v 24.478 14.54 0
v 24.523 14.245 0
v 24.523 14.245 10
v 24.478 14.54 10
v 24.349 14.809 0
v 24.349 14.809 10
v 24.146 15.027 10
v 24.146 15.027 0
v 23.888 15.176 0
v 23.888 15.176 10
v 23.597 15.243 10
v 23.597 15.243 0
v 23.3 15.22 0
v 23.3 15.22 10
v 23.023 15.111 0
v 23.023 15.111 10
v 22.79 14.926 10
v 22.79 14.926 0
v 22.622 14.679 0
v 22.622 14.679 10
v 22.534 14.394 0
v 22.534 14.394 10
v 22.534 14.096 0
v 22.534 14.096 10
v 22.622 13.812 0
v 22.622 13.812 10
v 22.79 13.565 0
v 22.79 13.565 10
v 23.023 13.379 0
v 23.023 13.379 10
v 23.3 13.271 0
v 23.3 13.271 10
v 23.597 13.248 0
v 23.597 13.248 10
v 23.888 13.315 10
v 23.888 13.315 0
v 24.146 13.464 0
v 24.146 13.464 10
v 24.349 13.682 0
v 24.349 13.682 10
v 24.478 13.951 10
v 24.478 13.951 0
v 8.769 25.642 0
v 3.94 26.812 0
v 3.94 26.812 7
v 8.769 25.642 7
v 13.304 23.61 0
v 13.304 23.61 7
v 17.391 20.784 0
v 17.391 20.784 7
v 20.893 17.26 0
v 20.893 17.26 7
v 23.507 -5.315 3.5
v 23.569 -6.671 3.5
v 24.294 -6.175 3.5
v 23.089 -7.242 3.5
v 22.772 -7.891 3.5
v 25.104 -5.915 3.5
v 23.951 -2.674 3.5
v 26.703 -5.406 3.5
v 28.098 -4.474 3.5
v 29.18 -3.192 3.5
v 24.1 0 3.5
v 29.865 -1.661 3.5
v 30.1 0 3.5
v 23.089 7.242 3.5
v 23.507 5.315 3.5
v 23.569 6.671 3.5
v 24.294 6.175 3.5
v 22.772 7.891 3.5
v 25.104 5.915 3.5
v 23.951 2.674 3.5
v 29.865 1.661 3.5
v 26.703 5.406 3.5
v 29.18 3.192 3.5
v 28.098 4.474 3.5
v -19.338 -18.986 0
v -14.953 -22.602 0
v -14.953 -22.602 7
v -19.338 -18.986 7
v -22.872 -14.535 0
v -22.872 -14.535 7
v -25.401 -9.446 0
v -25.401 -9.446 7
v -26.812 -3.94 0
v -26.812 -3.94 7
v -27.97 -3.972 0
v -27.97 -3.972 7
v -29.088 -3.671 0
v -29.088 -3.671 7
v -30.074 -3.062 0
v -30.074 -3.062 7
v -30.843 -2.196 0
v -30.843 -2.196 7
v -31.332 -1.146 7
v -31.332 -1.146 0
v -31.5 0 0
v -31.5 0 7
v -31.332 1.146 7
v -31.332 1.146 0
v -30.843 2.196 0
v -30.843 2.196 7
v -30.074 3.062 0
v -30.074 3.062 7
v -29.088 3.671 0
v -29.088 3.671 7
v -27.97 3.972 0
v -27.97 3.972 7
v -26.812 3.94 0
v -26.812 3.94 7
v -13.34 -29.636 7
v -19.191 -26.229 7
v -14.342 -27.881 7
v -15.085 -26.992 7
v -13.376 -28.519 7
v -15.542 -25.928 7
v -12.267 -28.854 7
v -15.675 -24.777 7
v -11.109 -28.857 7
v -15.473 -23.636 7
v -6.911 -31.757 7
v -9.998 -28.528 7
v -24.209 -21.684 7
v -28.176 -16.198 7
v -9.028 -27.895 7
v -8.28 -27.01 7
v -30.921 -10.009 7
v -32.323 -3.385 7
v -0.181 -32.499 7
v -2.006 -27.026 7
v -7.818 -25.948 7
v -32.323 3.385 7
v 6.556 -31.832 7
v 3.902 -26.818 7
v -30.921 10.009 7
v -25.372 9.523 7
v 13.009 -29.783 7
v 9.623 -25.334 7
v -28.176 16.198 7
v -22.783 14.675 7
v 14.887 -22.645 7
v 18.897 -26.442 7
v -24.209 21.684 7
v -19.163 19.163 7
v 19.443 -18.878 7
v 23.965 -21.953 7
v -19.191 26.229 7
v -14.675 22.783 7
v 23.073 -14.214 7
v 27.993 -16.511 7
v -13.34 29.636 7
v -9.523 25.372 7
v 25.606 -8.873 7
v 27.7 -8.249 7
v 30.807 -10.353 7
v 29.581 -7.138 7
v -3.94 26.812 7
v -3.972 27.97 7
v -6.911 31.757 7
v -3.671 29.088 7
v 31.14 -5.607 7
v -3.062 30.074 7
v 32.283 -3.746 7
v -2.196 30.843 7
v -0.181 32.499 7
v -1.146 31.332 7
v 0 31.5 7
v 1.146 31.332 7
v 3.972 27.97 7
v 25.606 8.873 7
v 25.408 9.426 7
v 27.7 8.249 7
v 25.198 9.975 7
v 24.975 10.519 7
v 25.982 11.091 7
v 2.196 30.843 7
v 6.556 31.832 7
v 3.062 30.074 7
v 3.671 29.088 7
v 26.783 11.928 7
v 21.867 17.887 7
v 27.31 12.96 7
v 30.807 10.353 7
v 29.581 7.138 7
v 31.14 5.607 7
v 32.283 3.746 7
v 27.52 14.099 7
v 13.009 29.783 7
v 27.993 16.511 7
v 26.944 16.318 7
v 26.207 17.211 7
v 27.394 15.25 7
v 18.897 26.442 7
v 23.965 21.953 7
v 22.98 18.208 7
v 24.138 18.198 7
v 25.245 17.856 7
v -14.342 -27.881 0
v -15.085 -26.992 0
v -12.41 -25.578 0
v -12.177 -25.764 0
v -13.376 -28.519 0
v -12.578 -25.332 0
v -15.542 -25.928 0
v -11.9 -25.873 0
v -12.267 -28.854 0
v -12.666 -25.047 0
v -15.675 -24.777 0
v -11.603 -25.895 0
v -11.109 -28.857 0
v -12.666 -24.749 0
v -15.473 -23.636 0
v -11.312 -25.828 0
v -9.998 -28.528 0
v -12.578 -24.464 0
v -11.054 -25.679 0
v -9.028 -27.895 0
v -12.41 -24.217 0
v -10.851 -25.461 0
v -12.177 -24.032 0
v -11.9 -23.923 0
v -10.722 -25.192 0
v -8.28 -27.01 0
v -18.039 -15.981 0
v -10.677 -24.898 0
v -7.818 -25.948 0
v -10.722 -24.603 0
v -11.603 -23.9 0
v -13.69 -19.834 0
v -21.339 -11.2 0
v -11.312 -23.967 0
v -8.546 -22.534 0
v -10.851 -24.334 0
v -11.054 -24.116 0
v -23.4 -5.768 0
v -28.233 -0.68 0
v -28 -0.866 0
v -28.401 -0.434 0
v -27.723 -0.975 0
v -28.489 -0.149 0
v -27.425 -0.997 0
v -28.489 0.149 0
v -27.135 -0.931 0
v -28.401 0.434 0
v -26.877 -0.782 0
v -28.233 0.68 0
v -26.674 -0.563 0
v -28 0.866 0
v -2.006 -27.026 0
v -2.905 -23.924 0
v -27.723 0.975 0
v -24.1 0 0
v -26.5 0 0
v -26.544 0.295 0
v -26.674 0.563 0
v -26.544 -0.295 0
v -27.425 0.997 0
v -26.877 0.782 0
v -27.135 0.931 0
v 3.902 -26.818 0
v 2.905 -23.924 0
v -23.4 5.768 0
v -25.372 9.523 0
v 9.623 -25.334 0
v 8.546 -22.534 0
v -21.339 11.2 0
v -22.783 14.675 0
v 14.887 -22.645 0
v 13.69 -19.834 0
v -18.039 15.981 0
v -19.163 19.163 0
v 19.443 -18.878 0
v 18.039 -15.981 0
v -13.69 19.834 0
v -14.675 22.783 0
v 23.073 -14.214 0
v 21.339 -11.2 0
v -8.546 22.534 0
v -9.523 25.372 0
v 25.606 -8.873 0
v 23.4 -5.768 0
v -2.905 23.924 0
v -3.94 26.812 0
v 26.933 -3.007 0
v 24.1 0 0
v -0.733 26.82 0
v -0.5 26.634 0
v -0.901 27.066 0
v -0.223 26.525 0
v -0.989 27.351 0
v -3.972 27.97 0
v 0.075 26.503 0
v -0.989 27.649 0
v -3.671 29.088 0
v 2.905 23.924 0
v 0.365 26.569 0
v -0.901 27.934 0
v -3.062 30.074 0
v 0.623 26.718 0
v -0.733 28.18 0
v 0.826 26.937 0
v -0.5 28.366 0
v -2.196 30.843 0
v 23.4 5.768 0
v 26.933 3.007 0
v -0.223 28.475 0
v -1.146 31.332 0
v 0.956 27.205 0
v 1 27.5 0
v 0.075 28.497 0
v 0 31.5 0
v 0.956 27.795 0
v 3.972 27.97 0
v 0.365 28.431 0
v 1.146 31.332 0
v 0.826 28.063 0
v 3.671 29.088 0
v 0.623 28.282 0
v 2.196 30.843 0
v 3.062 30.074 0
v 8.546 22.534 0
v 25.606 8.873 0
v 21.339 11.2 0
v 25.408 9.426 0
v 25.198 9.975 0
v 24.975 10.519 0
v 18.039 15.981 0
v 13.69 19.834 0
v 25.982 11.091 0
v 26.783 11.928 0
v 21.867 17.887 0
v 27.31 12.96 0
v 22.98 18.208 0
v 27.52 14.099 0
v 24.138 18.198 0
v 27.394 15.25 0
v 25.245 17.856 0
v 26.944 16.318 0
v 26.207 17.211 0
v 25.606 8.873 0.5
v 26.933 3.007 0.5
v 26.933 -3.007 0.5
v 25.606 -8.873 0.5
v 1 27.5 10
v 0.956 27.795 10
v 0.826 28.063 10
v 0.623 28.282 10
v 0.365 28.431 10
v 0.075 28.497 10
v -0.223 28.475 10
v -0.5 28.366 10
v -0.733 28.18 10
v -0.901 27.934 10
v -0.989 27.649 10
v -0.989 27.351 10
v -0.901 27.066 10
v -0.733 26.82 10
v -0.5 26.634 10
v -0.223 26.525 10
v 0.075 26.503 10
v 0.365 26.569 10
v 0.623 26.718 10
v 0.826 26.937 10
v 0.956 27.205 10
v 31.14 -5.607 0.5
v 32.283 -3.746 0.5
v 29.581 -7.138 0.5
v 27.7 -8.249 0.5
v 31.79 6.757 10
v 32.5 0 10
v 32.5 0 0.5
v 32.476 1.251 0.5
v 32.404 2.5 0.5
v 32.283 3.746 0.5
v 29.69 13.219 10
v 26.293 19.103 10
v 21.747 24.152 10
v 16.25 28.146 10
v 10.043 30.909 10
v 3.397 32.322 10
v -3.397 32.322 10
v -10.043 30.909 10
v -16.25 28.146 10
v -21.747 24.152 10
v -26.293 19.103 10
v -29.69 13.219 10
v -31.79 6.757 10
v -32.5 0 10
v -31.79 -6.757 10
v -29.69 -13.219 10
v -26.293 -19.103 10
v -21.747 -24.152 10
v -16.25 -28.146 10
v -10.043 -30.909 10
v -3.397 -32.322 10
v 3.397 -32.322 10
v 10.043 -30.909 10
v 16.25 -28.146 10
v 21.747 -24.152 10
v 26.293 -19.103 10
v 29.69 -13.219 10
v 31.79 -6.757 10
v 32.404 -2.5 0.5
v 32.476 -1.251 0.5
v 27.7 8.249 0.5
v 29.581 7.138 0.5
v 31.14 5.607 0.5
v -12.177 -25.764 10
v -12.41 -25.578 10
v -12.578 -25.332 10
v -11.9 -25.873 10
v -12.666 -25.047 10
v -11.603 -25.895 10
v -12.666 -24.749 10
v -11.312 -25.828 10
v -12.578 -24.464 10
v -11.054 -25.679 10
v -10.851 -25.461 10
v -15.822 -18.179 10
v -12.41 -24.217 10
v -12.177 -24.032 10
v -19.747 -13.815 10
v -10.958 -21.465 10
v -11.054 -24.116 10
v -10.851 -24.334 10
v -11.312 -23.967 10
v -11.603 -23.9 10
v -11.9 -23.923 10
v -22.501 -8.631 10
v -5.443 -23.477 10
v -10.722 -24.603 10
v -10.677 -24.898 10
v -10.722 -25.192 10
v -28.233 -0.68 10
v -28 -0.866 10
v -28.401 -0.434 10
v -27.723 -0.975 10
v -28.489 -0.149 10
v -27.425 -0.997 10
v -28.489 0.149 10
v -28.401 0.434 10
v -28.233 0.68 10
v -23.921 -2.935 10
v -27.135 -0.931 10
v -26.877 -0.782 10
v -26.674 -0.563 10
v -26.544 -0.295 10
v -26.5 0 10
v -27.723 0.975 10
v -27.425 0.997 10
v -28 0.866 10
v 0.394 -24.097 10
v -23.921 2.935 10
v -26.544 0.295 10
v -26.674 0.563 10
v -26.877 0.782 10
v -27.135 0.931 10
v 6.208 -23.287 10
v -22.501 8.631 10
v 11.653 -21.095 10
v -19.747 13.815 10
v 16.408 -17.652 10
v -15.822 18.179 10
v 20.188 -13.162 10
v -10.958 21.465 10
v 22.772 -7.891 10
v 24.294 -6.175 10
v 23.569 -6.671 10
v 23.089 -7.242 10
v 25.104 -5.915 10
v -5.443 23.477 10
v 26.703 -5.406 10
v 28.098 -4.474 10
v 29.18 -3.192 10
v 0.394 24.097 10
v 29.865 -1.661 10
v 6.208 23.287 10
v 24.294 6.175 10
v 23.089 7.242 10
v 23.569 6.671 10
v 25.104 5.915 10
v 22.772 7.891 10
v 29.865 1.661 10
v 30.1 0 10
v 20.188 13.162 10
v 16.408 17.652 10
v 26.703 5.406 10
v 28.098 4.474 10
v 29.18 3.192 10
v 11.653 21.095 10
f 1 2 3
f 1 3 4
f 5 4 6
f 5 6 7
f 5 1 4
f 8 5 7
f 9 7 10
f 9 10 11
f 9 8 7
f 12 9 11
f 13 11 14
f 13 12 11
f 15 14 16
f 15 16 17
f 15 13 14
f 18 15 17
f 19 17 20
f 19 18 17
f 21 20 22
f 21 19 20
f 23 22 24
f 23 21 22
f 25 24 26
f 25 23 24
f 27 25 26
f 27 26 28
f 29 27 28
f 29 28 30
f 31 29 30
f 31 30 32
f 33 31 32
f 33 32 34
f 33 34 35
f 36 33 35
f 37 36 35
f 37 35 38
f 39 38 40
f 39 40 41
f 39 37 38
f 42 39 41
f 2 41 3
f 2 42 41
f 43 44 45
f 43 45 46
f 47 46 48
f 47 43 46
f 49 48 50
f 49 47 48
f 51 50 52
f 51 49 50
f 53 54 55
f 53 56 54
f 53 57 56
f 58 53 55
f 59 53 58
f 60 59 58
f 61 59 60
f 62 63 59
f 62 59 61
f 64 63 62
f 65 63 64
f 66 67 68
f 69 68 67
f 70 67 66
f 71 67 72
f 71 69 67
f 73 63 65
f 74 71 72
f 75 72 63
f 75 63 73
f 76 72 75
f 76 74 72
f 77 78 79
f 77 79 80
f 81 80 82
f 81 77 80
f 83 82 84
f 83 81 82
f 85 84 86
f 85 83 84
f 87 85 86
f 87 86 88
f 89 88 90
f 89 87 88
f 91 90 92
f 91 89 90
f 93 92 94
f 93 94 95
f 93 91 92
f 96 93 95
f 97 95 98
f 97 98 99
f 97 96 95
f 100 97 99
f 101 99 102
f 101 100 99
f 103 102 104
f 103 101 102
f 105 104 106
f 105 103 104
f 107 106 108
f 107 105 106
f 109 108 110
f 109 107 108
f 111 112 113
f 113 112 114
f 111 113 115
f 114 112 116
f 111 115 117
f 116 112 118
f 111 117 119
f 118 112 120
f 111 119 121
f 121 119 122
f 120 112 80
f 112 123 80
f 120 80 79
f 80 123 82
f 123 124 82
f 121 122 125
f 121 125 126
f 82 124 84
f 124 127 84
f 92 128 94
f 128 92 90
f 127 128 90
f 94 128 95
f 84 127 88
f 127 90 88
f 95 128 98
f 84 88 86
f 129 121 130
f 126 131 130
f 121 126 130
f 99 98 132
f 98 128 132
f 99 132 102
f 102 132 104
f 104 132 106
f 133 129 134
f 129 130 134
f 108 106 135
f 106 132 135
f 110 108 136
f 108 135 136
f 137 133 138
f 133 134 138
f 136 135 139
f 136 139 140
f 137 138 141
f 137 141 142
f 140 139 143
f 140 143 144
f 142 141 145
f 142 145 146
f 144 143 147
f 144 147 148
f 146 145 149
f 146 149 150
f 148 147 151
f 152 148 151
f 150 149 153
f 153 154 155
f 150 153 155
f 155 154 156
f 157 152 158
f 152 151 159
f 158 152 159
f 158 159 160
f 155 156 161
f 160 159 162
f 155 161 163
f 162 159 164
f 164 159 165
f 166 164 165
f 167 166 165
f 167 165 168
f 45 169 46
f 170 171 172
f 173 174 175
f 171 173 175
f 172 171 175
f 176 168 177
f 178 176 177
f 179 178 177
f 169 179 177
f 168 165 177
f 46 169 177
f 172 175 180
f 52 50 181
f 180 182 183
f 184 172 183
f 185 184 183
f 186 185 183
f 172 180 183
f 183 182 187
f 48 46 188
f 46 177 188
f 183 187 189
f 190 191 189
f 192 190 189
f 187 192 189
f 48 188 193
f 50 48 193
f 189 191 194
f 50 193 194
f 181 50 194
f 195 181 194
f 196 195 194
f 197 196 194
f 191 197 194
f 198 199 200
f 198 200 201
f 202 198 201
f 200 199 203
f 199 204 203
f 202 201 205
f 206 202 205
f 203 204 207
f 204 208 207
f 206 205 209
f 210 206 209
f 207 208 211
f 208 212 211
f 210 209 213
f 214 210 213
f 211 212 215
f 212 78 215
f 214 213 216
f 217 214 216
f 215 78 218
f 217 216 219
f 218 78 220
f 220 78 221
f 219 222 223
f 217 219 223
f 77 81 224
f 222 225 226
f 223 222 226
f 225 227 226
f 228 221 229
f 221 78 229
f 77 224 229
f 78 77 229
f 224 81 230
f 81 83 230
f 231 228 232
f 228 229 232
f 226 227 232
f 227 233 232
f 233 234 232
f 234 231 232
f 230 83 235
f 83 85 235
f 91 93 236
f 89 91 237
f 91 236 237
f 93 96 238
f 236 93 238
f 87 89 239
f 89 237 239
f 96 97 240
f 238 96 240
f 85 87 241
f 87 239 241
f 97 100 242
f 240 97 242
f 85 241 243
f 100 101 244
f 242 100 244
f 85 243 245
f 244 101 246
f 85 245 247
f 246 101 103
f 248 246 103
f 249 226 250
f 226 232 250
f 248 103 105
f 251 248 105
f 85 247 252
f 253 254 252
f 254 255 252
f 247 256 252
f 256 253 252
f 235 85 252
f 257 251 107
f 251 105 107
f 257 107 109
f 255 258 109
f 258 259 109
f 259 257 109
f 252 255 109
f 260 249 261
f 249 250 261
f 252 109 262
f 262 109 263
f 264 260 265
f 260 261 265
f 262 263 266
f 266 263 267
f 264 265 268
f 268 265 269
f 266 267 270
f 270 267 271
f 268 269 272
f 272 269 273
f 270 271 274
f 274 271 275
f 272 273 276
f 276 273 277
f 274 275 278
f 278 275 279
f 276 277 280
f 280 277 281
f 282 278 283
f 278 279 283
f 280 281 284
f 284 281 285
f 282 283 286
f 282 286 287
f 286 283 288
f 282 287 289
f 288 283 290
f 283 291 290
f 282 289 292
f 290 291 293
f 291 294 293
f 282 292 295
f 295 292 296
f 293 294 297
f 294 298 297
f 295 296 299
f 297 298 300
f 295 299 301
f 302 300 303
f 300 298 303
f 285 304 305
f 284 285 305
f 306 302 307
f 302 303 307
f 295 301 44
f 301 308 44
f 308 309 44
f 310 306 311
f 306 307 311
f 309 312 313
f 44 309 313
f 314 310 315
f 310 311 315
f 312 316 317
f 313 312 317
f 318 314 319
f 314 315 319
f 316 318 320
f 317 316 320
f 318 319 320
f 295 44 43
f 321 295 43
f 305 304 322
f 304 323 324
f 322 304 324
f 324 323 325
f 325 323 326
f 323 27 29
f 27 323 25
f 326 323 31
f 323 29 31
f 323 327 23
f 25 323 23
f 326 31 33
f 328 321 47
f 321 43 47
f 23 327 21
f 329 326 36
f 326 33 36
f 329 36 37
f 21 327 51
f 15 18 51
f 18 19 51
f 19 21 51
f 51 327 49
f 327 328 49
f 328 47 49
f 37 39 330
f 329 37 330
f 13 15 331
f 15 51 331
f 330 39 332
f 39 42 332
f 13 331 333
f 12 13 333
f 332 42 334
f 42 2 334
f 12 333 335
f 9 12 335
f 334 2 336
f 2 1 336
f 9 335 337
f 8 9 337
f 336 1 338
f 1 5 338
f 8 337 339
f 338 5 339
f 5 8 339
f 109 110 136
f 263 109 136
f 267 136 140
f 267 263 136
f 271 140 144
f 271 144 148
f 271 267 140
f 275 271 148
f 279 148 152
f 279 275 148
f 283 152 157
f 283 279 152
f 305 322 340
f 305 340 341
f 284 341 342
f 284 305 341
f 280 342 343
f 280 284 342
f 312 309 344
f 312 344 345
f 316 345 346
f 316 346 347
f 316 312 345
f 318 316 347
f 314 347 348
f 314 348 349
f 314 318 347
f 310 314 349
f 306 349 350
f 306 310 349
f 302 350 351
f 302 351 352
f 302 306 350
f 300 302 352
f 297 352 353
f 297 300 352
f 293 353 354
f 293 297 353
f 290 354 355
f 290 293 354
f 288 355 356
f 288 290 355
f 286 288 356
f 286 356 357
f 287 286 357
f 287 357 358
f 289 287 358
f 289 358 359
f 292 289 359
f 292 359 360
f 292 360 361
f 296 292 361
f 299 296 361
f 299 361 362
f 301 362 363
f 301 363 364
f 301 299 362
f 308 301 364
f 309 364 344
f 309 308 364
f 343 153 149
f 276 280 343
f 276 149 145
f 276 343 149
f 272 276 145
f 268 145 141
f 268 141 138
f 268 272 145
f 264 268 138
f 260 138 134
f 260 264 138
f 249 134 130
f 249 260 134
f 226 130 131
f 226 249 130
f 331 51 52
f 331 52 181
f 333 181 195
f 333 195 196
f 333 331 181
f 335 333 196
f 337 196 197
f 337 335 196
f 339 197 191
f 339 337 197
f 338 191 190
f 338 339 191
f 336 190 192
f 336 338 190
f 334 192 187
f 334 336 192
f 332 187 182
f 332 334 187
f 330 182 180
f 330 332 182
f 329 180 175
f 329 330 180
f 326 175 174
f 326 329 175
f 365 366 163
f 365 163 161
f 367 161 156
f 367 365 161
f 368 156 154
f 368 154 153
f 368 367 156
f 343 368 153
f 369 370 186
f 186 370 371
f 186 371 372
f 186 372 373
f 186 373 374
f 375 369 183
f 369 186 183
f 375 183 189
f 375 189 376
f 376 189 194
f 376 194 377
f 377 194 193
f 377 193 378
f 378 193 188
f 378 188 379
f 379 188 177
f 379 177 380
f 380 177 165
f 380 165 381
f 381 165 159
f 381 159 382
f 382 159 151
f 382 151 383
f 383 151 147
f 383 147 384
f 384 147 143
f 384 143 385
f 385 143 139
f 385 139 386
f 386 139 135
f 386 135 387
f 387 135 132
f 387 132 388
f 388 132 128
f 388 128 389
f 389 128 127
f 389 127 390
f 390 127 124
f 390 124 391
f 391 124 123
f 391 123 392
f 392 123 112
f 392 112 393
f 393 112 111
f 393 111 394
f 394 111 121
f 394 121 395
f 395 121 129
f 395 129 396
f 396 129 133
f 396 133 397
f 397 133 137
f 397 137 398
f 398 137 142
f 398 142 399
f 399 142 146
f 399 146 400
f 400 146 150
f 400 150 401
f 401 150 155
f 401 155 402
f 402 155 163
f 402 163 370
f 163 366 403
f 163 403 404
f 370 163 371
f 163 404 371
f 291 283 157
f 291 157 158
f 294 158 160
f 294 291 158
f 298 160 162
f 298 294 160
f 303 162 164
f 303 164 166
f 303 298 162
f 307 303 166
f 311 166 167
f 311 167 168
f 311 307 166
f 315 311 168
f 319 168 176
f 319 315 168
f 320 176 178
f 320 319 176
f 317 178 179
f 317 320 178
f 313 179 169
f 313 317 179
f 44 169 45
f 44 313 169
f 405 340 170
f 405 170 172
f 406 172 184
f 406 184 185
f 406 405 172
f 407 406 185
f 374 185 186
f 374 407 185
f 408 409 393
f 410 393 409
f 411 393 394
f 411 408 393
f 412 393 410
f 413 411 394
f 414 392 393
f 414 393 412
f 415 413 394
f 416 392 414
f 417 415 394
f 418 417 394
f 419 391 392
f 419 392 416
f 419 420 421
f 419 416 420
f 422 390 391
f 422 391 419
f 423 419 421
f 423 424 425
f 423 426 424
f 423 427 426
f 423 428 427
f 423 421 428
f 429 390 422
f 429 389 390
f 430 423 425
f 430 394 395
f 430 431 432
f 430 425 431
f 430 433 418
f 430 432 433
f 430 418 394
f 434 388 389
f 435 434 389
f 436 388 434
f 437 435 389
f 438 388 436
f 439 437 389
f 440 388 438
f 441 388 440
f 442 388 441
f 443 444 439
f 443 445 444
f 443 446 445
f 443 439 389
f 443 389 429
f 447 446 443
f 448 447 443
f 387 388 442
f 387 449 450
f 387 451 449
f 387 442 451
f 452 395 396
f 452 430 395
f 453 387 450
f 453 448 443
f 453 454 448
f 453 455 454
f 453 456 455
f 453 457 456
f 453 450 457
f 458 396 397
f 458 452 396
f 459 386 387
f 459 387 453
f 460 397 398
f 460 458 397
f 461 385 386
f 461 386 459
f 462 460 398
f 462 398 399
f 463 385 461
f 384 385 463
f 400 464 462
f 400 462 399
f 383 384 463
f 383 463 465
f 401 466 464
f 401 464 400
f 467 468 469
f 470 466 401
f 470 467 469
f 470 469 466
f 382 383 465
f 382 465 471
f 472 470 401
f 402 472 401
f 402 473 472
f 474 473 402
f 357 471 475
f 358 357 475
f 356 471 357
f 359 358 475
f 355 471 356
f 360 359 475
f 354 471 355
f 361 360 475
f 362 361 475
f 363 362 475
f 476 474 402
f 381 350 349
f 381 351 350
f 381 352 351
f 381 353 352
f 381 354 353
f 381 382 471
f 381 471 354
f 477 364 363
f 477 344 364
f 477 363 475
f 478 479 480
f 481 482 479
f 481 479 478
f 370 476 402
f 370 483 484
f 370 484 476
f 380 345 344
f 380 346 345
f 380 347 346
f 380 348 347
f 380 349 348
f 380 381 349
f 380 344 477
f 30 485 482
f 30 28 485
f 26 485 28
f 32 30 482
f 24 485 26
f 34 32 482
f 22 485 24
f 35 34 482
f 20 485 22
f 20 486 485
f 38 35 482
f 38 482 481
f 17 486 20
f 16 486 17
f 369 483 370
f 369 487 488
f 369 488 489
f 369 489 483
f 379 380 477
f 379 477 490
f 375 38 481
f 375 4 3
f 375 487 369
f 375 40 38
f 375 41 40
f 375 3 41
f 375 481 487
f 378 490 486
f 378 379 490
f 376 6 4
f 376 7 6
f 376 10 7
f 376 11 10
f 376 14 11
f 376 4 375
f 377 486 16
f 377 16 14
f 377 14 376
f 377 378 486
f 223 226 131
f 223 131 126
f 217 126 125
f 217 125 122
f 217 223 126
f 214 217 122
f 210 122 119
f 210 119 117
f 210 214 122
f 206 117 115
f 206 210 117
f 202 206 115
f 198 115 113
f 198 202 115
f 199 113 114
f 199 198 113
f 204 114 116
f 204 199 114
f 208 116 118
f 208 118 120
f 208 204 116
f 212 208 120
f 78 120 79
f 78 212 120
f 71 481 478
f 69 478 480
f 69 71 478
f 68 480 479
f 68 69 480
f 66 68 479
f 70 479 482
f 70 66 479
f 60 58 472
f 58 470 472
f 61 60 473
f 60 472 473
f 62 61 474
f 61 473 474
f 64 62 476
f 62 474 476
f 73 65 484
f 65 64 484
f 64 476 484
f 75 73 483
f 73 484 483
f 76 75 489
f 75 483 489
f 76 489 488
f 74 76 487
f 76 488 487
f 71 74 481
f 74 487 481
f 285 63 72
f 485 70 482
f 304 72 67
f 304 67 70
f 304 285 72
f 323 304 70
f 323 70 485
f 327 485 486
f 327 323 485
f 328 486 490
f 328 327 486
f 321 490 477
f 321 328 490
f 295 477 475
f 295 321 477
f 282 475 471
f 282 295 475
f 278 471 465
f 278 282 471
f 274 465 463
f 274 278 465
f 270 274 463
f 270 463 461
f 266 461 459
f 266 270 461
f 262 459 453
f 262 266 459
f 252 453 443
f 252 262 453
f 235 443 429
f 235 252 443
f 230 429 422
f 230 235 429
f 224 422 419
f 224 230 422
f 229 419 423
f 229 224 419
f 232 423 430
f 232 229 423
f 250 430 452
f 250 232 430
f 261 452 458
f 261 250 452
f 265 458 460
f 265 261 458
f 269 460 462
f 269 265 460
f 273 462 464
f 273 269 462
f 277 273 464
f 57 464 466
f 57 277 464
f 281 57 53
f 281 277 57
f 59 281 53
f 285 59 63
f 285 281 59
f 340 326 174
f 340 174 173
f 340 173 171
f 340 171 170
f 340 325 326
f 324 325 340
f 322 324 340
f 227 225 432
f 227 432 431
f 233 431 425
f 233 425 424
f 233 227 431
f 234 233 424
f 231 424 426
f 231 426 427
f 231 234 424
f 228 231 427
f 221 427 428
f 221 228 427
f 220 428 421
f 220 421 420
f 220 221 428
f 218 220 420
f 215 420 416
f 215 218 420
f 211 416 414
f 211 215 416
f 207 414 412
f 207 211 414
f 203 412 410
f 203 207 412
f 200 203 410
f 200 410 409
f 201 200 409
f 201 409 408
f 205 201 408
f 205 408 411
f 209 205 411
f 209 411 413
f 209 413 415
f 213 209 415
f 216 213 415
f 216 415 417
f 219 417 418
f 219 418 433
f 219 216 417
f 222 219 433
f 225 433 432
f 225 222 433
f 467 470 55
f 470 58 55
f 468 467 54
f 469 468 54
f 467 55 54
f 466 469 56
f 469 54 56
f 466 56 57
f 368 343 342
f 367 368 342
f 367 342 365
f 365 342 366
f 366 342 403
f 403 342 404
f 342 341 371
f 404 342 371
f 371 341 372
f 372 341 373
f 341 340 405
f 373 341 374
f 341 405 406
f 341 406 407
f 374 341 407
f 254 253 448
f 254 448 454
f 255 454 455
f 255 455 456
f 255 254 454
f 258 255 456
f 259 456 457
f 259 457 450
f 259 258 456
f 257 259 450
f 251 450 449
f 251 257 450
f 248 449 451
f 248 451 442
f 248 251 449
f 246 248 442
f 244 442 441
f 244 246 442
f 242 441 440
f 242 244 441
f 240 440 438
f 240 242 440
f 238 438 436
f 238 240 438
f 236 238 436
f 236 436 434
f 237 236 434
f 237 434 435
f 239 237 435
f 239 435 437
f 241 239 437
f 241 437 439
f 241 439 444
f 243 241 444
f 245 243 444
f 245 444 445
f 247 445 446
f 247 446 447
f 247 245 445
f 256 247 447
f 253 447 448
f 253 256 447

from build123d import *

# Parameters (mm, degrees)
SKETCH1_R                = 32.5
SKETCH1_R_2              = 24.1
SKETCH1_R_3              = 1
RING_BODY_DEPTH          = 10
SKETCH2_R                = 6
NUB_CUT_DEPTH            = 6.5
NUB_CUT_FILLETS_3MM_R    = 3
WEIGHT_REDUCTION_DEPTH   = 7
WEIGHT_REDUCTION_2_DEPTH = 0.5


# Read off the part's stored shape, not the designer's step: Weight reduction
with BuildPart() as part:
    # Sketch1 → Ring body (new body)
    with BuildSketch(Plane.XY):
        Circle(SKETCH1_R)
        Circle(SKETCH1_R_2, mode=Mode.SUBTRACT)
        with Locations((0, 27.5)):
            Circle(SKETCH1_R_3, mode=Mode.SUBTRACT)
        with Locations((23.5226917, 14.245454545)):
            Circle(SKETCH1_R_3, mode=Mode.SUBTRACT)
        with Locations((-27.5, 0)):
            Circle(SKETCH1_R_3, mode=Mode.SUBTRACT)
        with Locations((-11.677272727, -24.897616385)):
            Circle(SKETCH1_R_3, mode=Mode.SUBTRACT)
    extrude(amount=RING_BODY_DEPTH)

    # Sketch2 → Nub cut (cut)
    with BuildSketch(Plane.XY.offset(10)):
        with Locations((24.1, 0)):
            Circle(SKETCH2_R)
    extrude(amount=-NUB_CUT_DEPTH, mode=Mode.SUBTRACT)

    # Nub cut fillets 3mm
    nub_cut_fillets_3mm_edges = [part.edges().sort_by_distance(p)[0] for p in [
        (23.353112033, 5.953331703, 6.75),
        (23.353112033, -5.953331703, 6.75),
    ]]
    fillet(nub_cut_fillets_3mm_edges, radius=NUB_CUT_FILLETS_3MM_R)

    # Weight reduction outline → Weight reduction (cut)
    with BuildSketch(Plane.XY):
        with BuildLine():
            ThreePointArc((32.28340249, -3.745920941), (29.581251517, -7.138338869), (25.606224066, -8.87306537))
            ThreePointArc((25.606224066, -8.87306537), (12.328674894, -24.13325041), (-7.817628093, -25.947922672))
            ThreePointArc((-7.817628093, -25.947922672), (-13.375785124, -28.519087859), (-14.952629097, -22.601523911))
            ThreePointArc((-14.952629097, -22.601523911), (-22.872047594, -14.535454545), (-26.812, -3.940387798))
            ThreePointArc((-26.812, -3.940387798), (-31.5, 0), (-26.812, 3.940387798))
            ThreePointArc((-26.812, 3.940387798), (-19.16259377, 19.16259377), (-3.940387798, 26.812))
            ThreePointArc((-3.940387798, 26.812), (0, 31.5), (3.940387798, 26.812))
            ThreePointArc((3.940387798, 26.812), (13.303636364, 23.60981278), (20.893010712, 17.259551077))
            ThreePointArc((20.893010712, 17.259551077), (26.944174129, 16.317520661), (24.975382732, 10.51856727))
            ThreePointArc((24.975382732, 10.51856727), (25.304182573, 9.700945537), (25.606224067, 8.87306537))
            ThreePointArc((25.606224067, 8.87306537), (29.581251517, 7.138338869), (32.28340249, 3.745920941))
            ThreePointArc((32.28340249, 3.745920941), (-32.5, 0), (32.28340249, -3.745920941))
        make_face()
    extrude(amount=WEIGHT_REDUCTION_DEPTH, mode=Mode.SUBTRACT)

    # Weight reduction 2 outline → Weight reduction 2 (cut)
    with BuildSketch(Plane.XY):
        with BuildLine():
            ThreePointArc((25.606224067, 8.87306537), (27.1, 0), (25.606224066, -8.87306537))
            ThreePointArc((25.606224066, -8.87306537), (29.581251517, -7.138338869), (32.28340249, -3.745920941))
            ThreePointArc((32.28340249, -3.745920941), (32.5, 0), (32.28340249, 3.745920941))
            ThreePointArc((32.28340249, 3.745920941), (29.581251517, 7.138338869), (25.606224067, 8.87306537))
        make_face()
    extrude(amount=WEIGHT_REDUCTION_2_DEPTH, mode=Mode.SUBTRACT)


solid = part.part
